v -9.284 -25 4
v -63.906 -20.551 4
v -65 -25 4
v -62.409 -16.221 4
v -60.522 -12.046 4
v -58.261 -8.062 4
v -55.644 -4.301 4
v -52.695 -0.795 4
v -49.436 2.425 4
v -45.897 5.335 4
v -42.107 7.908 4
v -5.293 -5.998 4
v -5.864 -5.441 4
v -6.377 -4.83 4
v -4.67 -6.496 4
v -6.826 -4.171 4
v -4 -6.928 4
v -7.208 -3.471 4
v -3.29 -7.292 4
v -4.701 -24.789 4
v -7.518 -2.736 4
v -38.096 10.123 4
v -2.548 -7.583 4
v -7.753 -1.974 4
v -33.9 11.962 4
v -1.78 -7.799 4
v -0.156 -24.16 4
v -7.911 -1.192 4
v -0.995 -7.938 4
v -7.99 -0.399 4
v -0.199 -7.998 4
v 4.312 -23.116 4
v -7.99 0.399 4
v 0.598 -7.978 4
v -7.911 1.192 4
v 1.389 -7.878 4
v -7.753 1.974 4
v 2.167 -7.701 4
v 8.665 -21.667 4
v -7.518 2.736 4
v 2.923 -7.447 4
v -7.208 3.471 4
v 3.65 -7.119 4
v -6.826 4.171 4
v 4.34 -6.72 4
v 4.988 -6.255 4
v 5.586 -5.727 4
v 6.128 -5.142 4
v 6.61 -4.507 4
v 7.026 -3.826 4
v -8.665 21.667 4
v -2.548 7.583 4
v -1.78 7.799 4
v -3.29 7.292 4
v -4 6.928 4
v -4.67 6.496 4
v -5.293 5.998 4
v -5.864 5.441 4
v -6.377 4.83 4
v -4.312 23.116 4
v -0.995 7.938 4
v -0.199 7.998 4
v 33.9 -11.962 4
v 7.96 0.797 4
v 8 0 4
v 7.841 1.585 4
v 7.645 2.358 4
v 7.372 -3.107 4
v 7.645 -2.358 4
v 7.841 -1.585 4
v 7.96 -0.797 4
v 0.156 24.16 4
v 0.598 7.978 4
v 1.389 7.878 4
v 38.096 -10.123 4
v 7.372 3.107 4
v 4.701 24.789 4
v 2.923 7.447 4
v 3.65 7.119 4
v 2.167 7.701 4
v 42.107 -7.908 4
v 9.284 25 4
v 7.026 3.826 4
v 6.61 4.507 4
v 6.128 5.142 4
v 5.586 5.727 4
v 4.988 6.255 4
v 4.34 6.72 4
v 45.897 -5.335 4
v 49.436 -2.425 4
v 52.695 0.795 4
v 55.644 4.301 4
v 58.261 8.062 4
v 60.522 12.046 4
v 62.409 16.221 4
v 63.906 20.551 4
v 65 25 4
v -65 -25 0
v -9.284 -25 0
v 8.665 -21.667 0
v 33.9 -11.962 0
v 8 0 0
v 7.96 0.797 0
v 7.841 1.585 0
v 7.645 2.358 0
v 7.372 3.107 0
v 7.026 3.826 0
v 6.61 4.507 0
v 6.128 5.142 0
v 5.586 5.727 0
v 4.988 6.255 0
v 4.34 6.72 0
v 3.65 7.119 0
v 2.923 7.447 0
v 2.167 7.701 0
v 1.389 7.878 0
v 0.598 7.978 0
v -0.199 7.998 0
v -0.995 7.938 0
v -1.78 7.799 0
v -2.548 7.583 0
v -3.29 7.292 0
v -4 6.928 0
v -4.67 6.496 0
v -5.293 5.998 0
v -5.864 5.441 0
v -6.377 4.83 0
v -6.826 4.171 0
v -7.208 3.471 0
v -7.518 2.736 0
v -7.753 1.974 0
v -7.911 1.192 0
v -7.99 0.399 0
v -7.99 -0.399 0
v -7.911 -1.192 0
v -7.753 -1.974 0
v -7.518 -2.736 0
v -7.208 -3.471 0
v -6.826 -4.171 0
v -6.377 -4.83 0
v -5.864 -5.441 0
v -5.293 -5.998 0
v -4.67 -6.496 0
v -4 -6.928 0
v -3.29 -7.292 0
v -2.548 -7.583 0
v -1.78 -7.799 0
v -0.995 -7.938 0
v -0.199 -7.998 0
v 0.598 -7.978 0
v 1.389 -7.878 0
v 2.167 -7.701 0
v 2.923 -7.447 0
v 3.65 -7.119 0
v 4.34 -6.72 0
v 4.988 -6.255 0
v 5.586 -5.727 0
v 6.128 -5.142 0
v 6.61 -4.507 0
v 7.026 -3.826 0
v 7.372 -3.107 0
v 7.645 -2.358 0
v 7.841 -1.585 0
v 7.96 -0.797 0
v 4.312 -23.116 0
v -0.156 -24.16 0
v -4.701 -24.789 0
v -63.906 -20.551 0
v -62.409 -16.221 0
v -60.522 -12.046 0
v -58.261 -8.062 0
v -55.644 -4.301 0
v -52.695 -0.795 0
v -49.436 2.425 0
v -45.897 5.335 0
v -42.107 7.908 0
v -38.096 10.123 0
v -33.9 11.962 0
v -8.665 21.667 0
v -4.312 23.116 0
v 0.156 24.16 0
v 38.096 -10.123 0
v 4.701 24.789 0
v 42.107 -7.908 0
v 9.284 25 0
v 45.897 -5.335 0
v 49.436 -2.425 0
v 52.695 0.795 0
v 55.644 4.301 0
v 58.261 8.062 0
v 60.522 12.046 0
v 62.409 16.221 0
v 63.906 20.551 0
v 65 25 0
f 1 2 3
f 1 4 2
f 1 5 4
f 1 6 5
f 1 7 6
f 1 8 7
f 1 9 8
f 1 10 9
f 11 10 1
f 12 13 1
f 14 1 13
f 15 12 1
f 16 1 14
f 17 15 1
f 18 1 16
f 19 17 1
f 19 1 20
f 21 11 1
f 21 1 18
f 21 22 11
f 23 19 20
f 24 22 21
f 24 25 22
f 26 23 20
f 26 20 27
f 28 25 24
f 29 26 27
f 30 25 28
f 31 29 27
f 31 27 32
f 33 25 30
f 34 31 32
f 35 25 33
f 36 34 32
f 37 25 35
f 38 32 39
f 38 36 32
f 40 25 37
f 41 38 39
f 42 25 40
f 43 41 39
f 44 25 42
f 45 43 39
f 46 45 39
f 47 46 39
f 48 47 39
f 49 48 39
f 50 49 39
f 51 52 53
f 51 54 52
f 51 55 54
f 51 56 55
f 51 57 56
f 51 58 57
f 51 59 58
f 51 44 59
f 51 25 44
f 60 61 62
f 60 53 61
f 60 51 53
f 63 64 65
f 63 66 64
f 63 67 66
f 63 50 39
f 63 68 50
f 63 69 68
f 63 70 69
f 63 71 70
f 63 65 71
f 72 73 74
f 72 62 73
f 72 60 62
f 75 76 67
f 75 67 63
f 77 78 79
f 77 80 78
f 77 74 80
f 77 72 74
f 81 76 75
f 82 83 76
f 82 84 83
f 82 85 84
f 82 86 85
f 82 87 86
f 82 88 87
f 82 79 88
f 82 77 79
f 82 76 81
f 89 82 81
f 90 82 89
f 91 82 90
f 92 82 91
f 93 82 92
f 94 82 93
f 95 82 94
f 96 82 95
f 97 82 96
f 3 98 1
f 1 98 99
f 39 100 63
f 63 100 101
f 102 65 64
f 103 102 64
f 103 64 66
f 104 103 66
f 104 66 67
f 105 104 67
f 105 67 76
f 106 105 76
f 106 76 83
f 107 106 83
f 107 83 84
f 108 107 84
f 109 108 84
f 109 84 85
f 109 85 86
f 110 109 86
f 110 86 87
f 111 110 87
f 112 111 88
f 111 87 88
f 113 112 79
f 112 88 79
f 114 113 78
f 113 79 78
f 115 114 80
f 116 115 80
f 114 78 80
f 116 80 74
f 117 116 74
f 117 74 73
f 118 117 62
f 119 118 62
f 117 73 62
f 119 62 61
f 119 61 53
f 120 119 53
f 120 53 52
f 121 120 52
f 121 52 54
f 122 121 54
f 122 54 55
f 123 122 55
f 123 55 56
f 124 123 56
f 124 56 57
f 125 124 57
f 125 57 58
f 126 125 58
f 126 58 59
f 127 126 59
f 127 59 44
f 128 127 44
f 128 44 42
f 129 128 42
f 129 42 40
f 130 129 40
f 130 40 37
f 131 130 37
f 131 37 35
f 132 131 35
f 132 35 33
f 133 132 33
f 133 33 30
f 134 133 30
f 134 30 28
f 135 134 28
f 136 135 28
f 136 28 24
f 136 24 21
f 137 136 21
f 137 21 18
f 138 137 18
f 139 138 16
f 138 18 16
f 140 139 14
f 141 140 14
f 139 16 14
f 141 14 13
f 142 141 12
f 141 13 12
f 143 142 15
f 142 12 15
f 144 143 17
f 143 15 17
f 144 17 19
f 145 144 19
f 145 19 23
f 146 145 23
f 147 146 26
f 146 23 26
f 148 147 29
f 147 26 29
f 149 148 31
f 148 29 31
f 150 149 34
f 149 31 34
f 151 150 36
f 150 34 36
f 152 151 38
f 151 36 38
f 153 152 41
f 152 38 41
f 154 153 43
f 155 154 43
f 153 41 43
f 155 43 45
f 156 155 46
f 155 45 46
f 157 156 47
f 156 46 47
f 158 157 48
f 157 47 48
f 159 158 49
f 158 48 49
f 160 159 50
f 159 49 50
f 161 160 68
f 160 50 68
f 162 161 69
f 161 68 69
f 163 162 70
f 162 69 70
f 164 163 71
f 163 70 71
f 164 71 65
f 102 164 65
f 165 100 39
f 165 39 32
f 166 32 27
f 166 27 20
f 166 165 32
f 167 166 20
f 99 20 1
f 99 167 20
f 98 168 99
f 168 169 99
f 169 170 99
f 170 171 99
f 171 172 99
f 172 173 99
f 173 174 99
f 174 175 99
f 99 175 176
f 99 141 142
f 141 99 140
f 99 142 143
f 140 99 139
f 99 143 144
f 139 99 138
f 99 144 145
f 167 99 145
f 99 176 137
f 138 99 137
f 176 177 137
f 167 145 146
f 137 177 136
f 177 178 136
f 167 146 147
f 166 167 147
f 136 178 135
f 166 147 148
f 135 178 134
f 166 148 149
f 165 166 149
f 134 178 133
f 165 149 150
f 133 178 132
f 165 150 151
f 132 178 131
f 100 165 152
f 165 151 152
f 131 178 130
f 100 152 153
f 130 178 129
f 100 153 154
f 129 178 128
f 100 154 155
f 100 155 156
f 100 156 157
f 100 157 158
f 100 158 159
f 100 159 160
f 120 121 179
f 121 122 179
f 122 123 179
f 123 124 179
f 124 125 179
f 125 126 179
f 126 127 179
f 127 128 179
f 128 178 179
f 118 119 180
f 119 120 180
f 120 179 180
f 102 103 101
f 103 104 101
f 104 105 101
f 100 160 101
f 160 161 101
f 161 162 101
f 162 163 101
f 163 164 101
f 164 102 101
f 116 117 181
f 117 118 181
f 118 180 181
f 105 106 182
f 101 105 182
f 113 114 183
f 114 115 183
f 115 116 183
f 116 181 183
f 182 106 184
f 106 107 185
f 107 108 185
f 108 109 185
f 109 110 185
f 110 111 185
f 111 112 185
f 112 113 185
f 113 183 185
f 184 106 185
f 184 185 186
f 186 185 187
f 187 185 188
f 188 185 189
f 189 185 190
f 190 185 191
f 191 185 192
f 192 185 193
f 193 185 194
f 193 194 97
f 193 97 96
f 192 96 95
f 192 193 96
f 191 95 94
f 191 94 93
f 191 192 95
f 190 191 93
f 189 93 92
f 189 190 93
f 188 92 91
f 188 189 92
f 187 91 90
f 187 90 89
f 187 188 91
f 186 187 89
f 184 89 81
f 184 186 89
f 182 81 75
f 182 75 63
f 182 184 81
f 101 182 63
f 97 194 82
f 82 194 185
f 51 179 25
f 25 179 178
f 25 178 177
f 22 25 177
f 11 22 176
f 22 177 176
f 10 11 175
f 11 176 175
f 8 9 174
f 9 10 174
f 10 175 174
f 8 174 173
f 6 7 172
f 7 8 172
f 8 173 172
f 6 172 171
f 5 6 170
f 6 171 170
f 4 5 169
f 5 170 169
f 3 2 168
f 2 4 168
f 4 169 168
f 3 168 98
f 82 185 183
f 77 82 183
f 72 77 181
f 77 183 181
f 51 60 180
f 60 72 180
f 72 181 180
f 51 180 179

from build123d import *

# Parameters (mm, degrees)
F1_DEPTH    = 4
F2_R        = 8
F3_DEPTH    = 25
F4_T1_DEPTH = 50.4194138592
F4_T3_DEPTH = 170.6048746571


# Not quite as in the source:
# - a fillet or chamfer that OpenCascade refuses, or shapes differently, is made with other operations: its cross-section is extruded or revolved along the edge and cut away or added


with BuildPart() as f1:
    # F0 (on Top) → F1 (new body)
    with BuildSketch(Plane.XY):
        Polygon((65, 0), (65, 25), (0, 25), (-65, 0), (-65, -25), (0, -25), align=None)
    extrude(amount=F1_DEPTH)

    # F2 (on face) → F3 (cut)
    with BuildSketch(Plane.XY.offset(4)):
        Circle(F2_R)
    extrude(amount=-F3_DEPTH, mode=Mode.SUBTRACT)

    # F4: fillet of radius 50 on 4 edges, made by hand

    # F4_s2 → F4_t1 (cut)
    with BuildSketch(Plane.XY.offset(-23.2097069296)):
        with BuildLine():
            ThreePointArc((8.6650711936, -21.6672803102), (-0.1560137847, -24.1597600457), (-9.2838827718, -25))
            Line((-9.2838827718, -25), (0, -25))
            Line((0, -25), (8.6650711936, -21.6672803102))
        make_face()
        with BuildLine():
            ThreePointArc((9.2838827718, 25), (0.1560137847, 24.1597600457), (-8.6650711936, 21.6672803102))
            Line((-8.6650711936, 21.6672803102), (0, 25))
            Line((0, 25), (9.2838827718, 25))
        make_face()
    extrude(amount=F4_T1_DEPTH, mode=Mode.SUBTRACT)

    # F4_s4 → F4_t3 (cut)
    with BuildSketch(Plane.XY.offset(-83.3024373285)):
        with BuildLine():
            ThreePointArc((-33.9000144534, 11.9615329026), (-54.209630263, -2.5144156742), (-65, -25))
            Line((-65, -25), (-65, 0))
            Line((-65, 0), (-33.9000144534, 11.9615329026))
        make_face()
        with BuildLine():
            ThreePointArc((65, 25), (54.209630263, 2.5144156742), (33.9000144534, -11.9615329026))
            Line((33.9000144534, -11.9615329026), (65, 0))
            Line((65, 0), (65, 25))
        make_face()
    extrude(amount=F4_T3_DEPTH, mode=Mode.SUBTRACT)


solid = f1.part
